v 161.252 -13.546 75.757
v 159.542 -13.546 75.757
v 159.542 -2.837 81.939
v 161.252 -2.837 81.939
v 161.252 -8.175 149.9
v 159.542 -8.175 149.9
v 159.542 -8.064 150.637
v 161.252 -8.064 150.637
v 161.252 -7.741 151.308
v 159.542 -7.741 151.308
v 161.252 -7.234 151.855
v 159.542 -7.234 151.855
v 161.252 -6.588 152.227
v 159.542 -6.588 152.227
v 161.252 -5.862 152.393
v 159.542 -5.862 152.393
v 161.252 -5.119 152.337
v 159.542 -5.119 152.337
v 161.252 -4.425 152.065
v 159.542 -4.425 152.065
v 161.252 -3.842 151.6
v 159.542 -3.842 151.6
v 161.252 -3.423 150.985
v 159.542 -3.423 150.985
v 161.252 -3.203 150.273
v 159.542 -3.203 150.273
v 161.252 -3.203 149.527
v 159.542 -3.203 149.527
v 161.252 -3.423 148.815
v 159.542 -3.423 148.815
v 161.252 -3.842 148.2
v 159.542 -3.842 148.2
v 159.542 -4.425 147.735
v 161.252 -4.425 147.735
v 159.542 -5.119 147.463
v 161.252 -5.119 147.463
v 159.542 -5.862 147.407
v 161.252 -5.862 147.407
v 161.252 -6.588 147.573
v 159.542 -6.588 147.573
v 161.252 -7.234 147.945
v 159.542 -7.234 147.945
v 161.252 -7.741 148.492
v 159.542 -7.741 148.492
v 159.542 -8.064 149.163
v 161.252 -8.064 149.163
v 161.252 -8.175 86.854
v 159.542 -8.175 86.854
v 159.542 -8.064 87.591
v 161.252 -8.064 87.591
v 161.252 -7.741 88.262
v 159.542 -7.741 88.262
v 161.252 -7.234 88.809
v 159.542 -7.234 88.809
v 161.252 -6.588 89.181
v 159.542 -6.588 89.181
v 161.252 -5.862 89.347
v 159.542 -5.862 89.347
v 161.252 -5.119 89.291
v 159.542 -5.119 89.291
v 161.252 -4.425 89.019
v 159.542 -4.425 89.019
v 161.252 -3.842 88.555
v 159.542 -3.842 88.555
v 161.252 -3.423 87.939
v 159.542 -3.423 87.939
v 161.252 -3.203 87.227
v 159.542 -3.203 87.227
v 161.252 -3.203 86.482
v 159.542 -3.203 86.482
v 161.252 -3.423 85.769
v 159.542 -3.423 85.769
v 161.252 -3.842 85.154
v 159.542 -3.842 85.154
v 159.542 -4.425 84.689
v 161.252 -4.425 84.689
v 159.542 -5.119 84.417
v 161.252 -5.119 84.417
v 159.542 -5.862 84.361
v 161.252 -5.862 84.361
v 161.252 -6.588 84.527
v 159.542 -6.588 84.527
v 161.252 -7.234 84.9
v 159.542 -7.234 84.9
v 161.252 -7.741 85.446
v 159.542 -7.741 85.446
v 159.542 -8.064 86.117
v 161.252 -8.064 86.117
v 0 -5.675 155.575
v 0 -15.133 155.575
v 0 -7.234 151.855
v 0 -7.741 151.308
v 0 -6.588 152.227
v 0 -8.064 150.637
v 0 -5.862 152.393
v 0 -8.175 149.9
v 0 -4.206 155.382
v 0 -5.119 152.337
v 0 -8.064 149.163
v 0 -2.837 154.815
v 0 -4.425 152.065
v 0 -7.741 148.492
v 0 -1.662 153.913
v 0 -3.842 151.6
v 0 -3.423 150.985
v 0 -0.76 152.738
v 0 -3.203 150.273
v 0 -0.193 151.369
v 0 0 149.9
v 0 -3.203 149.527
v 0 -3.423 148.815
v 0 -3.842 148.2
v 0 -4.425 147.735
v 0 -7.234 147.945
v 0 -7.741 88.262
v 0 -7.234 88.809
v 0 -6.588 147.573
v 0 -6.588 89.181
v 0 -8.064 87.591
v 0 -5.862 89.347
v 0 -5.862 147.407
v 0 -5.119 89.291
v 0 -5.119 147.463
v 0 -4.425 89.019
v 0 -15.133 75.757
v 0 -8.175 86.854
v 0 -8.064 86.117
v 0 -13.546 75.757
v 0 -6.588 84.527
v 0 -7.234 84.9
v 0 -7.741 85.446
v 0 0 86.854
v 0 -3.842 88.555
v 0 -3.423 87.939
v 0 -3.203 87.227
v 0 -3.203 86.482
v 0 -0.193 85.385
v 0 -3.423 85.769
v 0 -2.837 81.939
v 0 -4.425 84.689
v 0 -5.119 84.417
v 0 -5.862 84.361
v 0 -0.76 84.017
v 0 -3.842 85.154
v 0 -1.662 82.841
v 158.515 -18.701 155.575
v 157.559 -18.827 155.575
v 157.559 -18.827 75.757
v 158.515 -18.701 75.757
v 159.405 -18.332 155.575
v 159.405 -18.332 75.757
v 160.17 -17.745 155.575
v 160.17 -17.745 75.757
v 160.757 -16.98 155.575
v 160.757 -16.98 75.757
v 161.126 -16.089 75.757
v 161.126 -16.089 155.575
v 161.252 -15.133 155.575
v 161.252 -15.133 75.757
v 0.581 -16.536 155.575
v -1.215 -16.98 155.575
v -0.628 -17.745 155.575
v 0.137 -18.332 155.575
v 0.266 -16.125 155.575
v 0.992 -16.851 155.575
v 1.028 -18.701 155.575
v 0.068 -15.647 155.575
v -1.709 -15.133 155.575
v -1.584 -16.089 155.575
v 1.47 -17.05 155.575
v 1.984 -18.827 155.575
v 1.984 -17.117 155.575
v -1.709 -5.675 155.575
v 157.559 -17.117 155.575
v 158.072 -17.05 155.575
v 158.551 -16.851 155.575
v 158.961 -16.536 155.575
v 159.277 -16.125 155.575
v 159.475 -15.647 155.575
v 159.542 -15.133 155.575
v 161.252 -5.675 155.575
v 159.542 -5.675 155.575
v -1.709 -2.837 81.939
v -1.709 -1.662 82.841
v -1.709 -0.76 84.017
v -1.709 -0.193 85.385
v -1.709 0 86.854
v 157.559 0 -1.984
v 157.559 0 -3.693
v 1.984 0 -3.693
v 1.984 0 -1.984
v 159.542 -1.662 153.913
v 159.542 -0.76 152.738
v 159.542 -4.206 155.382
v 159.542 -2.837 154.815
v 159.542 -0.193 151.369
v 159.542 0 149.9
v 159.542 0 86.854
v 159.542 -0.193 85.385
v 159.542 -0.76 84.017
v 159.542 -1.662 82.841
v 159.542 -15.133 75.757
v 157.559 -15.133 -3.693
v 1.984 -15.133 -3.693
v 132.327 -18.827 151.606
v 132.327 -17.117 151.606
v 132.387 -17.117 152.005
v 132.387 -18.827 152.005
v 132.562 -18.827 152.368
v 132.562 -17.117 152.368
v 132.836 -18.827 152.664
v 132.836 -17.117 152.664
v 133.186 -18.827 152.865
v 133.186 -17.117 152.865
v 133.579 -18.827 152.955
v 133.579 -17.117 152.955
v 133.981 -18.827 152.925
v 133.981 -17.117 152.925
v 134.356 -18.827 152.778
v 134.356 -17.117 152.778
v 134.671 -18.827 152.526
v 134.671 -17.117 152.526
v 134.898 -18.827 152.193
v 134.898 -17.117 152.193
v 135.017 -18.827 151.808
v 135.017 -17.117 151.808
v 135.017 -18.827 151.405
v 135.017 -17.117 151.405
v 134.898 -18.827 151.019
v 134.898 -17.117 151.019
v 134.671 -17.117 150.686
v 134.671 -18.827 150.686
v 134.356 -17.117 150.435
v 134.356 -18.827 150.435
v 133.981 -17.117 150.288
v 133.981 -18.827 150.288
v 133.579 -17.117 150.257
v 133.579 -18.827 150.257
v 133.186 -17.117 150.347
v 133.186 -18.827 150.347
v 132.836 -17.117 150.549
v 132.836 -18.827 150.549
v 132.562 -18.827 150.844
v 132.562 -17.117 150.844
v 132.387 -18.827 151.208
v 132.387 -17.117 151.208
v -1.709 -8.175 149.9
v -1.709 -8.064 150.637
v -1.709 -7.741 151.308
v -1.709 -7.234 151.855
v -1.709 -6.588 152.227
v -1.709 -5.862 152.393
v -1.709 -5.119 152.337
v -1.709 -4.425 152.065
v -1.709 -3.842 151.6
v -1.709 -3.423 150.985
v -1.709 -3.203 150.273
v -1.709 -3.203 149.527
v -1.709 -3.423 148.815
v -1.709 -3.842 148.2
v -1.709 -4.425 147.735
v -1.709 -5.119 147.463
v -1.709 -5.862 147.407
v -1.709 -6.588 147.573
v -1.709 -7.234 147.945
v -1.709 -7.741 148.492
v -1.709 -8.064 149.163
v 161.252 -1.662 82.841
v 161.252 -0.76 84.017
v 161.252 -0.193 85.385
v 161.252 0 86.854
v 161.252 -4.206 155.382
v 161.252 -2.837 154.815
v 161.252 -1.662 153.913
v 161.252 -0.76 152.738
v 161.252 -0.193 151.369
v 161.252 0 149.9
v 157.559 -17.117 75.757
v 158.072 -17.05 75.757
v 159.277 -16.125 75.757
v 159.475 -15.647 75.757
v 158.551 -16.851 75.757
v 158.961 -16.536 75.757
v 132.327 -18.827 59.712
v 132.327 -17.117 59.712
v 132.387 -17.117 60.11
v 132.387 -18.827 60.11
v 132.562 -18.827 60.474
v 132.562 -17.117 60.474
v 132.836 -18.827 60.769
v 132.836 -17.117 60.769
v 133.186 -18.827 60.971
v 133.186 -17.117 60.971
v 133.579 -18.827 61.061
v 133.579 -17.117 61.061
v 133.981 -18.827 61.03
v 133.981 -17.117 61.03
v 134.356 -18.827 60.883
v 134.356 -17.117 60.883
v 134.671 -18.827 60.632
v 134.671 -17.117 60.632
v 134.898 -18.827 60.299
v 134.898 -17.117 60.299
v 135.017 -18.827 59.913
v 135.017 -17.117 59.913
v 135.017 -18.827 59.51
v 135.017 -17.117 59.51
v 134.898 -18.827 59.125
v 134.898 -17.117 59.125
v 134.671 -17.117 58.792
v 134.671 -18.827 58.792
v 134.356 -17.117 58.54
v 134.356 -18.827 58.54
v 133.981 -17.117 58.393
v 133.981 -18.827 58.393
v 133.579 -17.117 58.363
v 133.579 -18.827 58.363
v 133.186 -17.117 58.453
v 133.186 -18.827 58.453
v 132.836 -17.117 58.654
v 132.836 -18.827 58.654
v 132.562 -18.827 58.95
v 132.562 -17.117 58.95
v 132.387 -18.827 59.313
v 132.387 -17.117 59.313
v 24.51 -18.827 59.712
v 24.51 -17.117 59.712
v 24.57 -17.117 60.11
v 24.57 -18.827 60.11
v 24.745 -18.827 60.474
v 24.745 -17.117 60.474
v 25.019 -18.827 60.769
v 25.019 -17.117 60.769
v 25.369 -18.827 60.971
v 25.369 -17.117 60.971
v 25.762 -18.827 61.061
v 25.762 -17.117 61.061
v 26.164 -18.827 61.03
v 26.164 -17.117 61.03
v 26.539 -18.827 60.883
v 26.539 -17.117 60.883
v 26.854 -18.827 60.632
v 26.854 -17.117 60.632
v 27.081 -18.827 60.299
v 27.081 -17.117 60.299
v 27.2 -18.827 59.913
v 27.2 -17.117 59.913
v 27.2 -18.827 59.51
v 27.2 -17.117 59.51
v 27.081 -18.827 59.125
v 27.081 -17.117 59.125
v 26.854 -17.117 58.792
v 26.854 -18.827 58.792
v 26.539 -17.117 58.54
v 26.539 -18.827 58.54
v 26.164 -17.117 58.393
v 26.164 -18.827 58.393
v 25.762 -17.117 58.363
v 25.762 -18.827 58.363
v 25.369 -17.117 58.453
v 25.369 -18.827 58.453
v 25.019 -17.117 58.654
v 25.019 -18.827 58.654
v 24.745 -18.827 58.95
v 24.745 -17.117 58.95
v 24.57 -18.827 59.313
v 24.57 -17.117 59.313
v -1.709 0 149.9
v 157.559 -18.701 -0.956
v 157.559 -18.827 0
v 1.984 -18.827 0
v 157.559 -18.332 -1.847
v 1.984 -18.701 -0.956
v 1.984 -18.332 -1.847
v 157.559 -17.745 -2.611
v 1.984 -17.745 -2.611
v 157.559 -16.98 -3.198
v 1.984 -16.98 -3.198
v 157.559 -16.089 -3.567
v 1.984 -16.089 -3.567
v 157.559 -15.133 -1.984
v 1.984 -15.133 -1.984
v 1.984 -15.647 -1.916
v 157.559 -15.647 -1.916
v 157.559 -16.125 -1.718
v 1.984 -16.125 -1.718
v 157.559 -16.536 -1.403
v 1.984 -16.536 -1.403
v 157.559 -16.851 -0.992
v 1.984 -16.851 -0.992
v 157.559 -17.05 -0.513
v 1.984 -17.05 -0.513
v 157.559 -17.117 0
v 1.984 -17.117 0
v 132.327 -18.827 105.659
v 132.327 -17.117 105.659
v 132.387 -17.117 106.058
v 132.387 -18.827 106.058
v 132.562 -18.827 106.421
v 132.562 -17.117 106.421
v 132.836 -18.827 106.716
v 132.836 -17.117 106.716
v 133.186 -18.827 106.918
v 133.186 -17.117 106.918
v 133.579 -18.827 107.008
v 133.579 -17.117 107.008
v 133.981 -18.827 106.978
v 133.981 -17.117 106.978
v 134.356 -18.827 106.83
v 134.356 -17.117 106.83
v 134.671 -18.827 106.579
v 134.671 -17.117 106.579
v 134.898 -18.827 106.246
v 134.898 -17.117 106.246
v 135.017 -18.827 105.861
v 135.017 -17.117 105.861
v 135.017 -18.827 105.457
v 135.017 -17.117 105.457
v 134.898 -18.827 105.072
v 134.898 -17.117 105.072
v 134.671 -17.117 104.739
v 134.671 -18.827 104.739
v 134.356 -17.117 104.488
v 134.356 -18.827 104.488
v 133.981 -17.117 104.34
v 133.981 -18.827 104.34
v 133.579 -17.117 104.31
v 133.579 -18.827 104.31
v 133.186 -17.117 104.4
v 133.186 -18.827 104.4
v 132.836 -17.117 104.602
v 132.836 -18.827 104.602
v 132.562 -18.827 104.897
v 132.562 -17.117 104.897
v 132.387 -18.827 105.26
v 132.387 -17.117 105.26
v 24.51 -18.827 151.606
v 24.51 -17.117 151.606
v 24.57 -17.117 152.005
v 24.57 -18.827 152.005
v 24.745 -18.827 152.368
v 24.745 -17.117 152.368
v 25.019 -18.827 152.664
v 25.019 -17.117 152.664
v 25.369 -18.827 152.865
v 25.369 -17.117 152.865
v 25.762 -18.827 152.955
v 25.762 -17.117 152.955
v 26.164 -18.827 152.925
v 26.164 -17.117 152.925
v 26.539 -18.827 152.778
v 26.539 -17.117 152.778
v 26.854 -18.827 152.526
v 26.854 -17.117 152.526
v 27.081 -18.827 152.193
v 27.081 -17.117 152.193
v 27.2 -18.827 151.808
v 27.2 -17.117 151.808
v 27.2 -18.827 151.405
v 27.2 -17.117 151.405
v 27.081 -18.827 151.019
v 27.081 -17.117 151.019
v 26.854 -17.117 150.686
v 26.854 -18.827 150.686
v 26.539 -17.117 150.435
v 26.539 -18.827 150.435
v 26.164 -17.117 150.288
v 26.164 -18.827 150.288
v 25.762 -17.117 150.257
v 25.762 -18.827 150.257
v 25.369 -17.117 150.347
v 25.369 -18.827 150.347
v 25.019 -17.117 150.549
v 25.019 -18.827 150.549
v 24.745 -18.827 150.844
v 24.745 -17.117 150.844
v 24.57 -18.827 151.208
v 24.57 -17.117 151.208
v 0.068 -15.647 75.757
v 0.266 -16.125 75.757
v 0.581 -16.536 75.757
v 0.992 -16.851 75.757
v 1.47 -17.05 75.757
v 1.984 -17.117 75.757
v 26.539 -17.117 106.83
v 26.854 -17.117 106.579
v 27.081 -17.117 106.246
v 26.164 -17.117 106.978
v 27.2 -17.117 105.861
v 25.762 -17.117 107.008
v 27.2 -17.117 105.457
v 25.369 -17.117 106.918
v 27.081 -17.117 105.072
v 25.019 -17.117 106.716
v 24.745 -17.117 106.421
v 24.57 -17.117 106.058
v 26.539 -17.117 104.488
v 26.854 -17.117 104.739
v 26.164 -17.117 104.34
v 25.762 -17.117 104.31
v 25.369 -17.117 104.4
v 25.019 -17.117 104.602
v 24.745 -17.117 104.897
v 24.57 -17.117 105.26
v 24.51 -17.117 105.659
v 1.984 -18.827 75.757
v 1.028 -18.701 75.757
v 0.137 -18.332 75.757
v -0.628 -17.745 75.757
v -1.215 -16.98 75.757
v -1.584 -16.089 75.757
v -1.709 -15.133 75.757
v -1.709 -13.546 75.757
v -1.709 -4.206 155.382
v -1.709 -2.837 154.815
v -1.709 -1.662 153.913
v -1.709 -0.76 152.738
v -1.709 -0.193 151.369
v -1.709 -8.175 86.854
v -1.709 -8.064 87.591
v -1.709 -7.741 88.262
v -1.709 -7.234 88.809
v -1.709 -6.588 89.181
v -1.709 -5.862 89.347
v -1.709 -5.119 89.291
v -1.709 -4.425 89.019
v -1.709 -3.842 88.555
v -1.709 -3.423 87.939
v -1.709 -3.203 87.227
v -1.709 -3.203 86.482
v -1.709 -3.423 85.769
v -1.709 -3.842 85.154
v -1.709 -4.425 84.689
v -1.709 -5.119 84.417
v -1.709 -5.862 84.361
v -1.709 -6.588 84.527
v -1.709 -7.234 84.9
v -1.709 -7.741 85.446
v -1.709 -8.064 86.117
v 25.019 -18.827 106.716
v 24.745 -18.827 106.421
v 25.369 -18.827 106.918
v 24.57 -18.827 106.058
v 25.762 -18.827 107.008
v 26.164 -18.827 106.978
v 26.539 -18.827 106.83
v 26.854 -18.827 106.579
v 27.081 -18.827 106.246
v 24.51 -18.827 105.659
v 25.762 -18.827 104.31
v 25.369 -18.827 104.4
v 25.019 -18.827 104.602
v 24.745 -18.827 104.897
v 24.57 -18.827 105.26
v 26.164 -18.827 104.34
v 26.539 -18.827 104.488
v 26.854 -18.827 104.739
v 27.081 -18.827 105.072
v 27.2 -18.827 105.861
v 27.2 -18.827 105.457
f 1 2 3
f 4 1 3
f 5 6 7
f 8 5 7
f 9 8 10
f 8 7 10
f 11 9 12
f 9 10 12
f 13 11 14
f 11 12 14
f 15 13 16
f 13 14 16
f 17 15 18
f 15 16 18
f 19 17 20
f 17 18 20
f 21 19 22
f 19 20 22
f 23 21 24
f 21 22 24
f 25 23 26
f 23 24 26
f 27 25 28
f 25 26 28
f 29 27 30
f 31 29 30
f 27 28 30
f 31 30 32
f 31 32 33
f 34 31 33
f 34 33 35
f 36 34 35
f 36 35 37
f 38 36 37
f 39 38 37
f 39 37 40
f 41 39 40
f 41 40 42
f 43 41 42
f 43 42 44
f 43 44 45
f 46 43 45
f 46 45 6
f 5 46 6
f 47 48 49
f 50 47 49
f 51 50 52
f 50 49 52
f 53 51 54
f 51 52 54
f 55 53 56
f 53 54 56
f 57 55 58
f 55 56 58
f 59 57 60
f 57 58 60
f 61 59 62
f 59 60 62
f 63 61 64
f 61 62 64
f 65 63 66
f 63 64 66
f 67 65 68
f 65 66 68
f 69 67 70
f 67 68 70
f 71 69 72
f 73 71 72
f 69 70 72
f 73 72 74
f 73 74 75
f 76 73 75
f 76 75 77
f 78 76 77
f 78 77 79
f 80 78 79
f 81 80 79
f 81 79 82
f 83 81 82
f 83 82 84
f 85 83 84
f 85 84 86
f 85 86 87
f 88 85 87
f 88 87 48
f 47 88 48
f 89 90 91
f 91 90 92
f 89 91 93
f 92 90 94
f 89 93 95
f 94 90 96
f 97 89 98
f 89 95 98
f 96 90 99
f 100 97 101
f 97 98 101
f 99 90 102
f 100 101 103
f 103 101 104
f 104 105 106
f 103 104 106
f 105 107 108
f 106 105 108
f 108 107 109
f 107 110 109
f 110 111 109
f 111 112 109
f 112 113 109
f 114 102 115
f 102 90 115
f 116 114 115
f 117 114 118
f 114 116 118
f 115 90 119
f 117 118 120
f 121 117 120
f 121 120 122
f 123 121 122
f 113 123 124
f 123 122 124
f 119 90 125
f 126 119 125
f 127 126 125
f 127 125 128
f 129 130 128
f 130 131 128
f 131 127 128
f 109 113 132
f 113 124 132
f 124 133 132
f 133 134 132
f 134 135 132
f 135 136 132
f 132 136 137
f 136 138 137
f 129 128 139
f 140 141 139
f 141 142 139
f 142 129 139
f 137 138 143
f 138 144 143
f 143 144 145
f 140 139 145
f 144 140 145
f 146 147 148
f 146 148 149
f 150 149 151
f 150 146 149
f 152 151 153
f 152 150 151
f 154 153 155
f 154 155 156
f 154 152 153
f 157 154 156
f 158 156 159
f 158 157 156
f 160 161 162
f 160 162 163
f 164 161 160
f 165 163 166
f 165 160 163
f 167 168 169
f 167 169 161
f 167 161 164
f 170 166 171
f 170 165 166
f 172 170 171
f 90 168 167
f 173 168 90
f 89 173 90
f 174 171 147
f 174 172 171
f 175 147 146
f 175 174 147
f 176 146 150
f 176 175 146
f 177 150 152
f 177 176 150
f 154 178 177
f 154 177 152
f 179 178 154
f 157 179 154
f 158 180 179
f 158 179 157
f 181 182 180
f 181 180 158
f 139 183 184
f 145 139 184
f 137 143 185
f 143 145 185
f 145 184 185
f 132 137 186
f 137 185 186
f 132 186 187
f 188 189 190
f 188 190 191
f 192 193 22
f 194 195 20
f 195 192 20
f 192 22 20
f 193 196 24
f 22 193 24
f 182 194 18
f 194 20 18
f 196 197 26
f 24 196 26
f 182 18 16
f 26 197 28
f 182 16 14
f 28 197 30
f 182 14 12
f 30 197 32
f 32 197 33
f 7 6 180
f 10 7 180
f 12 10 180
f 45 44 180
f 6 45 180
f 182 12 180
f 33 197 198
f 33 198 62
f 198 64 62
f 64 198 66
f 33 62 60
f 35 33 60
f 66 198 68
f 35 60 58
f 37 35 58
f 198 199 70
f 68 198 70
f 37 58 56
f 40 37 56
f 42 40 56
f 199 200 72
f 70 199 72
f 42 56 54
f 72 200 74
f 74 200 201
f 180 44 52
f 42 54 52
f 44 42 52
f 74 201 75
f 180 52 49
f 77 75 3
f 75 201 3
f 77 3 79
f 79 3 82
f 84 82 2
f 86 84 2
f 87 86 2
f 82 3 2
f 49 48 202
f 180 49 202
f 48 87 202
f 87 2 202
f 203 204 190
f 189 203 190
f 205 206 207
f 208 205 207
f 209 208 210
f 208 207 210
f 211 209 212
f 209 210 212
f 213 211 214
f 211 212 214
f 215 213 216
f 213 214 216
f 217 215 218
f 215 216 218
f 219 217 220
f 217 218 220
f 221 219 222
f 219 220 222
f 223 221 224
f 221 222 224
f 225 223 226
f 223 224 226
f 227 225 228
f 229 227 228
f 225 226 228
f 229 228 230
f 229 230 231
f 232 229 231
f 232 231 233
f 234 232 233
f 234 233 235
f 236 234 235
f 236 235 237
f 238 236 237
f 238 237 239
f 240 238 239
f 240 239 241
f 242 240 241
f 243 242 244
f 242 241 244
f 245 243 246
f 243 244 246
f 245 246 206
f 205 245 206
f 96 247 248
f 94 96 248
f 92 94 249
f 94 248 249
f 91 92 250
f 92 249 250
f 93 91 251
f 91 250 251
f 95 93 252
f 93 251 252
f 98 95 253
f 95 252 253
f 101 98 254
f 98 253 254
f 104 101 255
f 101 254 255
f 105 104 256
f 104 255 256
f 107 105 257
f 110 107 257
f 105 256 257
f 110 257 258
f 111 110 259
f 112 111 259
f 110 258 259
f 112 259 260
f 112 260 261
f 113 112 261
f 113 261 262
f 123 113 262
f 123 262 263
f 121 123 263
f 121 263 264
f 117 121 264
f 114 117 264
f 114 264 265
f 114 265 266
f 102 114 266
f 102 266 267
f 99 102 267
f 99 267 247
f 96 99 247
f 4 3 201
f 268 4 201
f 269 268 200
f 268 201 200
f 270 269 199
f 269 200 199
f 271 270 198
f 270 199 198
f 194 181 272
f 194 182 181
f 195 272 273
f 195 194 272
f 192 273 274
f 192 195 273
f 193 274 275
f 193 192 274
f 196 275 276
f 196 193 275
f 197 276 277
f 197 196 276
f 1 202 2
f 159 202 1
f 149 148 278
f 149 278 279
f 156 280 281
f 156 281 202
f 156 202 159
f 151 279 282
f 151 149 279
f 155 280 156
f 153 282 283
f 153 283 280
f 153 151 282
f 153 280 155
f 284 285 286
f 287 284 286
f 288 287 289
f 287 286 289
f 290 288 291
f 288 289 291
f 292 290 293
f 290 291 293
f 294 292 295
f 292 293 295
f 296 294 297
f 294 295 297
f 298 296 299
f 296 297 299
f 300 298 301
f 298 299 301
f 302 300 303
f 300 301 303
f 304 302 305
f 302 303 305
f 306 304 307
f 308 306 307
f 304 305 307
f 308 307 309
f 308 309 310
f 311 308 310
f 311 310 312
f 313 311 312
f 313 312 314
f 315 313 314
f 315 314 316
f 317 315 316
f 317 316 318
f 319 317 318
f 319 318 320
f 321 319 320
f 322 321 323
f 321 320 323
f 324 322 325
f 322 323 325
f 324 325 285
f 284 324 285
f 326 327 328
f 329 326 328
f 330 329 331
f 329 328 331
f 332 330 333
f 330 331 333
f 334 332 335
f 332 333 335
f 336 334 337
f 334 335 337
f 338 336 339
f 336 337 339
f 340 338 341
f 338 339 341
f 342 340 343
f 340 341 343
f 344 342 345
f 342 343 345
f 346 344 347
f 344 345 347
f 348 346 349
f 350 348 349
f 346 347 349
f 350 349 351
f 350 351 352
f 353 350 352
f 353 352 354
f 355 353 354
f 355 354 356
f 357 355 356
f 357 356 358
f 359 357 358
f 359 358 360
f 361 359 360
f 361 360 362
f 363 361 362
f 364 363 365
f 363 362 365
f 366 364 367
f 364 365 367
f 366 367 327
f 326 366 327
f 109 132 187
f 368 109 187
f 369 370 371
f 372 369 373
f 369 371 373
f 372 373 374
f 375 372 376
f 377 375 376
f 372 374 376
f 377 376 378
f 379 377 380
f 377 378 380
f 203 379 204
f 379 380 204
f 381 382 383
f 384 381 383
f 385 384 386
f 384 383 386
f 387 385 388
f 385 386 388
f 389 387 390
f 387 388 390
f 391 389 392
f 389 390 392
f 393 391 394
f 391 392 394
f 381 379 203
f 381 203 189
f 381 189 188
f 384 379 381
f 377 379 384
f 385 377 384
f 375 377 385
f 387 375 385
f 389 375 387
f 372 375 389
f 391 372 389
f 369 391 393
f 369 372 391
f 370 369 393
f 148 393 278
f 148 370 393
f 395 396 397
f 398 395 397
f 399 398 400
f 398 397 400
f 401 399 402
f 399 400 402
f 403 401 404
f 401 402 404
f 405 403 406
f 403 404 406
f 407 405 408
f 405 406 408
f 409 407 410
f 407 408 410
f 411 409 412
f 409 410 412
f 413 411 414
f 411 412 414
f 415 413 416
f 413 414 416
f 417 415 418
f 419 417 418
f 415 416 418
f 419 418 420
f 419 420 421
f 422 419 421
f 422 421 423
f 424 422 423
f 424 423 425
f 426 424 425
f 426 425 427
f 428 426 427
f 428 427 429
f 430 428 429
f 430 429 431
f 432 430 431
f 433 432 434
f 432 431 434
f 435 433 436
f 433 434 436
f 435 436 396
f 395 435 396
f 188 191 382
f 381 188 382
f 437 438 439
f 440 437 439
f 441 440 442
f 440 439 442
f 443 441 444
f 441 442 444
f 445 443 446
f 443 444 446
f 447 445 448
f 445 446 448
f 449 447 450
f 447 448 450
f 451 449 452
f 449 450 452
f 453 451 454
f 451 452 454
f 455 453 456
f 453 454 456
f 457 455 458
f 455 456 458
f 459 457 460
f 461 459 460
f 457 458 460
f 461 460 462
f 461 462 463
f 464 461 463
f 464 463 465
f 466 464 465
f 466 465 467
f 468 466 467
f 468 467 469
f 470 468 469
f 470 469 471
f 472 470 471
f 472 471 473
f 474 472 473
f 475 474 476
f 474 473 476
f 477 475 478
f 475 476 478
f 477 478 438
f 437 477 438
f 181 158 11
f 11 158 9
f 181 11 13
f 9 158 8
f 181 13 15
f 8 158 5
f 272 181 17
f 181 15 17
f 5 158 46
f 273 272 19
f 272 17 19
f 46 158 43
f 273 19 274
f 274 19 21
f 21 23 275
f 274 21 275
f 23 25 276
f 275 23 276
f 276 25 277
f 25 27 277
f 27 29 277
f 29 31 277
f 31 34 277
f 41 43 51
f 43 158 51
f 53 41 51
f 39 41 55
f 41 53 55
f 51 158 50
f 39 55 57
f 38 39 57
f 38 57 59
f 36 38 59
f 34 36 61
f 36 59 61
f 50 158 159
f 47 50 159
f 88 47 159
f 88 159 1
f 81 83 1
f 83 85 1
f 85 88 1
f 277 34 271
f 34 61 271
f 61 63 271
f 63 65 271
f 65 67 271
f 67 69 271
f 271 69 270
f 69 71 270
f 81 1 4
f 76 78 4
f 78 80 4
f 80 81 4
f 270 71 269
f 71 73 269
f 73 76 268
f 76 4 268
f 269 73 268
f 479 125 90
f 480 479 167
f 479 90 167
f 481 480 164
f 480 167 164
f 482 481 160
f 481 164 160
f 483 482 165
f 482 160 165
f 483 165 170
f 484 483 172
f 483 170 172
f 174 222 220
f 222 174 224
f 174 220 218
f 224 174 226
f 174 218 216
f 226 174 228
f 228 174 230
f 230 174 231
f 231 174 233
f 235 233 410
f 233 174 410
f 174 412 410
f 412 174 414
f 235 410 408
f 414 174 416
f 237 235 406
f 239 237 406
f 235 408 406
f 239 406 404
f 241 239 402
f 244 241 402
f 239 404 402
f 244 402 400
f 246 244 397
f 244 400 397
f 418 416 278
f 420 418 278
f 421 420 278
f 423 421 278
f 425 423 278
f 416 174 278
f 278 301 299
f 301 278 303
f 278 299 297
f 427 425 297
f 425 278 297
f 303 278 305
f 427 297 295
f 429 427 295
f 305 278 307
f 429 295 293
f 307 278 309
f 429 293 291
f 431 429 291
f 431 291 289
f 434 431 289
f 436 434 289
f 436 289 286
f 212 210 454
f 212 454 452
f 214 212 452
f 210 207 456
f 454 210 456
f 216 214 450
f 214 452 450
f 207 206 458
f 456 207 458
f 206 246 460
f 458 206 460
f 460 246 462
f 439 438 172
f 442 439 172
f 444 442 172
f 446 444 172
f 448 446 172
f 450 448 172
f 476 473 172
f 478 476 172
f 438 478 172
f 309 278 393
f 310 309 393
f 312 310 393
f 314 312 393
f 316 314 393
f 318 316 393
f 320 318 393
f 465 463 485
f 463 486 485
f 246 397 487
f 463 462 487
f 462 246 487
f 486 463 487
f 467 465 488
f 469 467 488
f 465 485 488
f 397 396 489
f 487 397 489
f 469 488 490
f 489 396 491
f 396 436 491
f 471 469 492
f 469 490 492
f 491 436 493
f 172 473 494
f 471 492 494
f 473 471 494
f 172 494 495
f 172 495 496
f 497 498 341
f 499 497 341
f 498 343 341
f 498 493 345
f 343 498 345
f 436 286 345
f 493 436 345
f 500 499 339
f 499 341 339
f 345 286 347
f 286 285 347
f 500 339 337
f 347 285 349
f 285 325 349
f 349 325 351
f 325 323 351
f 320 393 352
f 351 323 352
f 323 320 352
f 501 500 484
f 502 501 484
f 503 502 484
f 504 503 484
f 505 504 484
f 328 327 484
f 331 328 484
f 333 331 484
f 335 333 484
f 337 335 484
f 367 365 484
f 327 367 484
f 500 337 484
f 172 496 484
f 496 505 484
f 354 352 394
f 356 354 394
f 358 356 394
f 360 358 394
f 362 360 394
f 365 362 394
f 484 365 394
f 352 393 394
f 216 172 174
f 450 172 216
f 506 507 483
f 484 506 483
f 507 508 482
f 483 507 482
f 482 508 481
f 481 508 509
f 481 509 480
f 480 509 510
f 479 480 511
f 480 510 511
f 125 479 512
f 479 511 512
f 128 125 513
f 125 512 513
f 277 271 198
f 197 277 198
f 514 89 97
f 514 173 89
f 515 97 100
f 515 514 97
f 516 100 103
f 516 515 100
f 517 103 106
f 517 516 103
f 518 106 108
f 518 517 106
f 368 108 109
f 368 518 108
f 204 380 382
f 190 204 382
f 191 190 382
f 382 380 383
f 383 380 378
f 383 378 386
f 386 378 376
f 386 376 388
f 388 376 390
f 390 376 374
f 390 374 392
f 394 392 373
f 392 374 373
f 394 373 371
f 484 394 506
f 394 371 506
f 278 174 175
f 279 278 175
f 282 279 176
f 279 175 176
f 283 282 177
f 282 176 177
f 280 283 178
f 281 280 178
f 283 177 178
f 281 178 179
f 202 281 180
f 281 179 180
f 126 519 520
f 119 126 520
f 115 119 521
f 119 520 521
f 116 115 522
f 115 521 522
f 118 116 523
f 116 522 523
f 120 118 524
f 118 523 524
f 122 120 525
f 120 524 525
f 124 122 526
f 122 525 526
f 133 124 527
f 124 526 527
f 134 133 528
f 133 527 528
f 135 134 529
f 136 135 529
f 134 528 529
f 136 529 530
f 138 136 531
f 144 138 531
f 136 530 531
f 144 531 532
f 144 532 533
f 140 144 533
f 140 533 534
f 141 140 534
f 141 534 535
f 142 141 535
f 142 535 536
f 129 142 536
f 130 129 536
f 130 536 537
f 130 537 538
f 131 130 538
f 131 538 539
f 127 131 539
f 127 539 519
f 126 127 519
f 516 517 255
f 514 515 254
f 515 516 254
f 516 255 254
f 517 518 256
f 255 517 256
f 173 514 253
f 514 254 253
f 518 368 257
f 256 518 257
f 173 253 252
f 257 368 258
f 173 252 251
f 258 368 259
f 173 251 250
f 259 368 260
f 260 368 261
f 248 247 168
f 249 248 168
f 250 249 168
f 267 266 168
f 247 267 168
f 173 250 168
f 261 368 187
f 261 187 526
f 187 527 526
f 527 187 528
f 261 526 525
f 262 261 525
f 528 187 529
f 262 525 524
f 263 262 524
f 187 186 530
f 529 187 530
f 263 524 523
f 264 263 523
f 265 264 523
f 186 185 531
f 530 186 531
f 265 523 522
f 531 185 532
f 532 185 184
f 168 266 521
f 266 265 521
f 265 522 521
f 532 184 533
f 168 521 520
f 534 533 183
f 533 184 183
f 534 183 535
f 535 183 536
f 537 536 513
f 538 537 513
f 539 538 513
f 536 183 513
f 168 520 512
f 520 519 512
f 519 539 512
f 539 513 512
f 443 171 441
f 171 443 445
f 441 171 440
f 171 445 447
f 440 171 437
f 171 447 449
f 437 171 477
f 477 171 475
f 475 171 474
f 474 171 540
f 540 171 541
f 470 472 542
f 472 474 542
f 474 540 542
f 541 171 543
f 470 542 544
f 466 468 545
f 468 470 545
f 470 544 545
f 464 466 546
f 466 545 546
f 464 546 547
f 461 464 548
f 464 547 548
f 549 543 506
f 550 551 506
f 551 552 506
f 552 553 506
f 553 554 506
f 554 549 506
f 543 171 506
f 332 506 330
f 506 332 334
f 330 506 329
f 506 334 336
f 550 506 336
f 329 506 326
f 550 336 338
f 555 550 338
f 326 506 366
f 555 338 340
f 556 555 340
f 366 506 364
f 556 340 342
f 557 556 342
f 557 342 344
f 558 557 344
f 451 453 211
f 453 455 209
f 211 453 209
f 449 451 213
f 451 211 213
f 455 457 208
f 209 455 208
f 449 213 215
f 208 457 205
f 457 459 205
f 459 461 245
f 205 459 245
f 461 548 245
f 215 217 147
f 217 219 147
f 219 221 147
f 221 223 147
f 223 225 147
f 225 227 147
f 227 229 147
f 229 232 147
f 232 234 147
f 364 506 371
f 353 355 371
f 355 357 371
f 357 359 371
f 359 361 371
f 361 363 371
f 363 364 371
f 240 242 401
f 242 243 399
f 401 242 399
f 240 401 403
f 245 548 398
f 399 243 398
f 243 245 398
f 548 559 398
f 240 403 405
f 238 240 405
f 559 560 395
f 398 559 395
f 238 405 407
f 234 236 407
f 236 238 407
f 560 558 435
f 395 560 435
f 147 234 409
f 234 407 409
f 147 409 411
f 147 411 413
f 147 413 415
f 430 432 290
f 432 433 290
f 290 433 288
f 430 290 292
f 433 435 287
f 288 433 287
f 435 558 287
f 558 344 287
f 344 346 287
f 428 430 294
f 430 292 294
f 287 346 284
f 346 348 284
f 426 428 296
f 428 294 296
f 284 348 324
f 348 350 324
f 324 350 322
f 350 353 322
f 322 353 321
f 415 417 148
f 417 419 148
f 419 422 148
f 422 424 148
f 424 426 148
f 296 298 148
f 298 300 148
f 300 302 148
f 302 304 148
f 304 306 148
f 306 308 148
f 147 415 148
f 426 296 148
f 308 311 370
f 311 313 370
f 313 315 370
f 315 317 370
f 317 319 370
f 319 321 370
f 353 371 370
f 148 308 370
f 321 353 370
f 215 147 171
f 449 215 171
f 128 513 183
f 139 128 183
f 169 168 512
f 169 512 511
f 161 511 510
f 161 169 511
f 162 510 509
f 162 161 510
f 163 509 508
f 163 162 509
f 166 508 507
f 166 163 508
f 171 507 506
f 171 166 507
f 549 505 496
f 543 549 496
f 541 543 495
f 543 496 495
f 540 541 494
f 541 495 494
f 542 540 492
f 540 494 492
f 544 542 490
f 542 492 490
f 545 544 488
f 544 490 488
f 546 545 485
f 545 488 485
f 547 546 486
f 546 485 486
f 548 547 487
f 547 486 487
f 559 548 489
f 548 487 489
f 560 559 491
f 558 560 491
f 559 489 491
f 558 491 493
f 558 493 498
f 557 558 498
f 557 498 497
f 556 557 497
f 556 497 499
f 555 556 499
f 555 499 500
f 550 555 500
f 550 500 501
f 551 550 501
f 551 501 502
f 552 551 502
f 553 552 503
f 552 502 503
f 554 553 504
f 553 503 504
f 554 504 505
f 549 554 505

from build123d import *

# Parameters (mm, degrees)
F1_DEPTH  = 155.575
F2_R      = 3.69316
F3_R      = 1.98374
F7_DEPTH  = 155.575
F8_R      = 2.5
F9_DEPTH  = 162.96132
F10_R     = 5.674995
F11_R     = 1.35255
F12_DEPTH = 1.70942
F13_W     = 3.69316
F13_H     = 75.7569519651
F14_DEPTH = 3.69316


with BuildPart() as f1:
    # F0 (on Top) → F1 (new body)
    with BuildSketch(Plane.XY):
        Polygon((0, 0), (-1.70942, 0), (-1.70942, -18.8265943), (161.2519, -18.8265943), (161.2519, 0), (159.54248, 0), (159.54248, -17.1171743), (0, -17.1171743), align=None)
    extrude(amount=F1_DEPTH)

    # F2
    f2_edges = [f1.edges().sort_by_distance(p)[0] for p in [
        (161.2519, -18.826594, 77.7875),
        (-1.70942, -18.826594, 77.7875),
    ]]
    fillet(f2_edges, radius=F2_R)

    # F3
    f3_edges = [f1.edges().sort_by_distance(p)[0] for p in [
        (159.54248, -17.117174, 77.7875),
        (0, -17.117174, 77.7875),
    ]]
    fillet(f3_edges, radius=F3_R)

    # F5 (on offset) → F7 (join, through all)
    with BuildSketch(Plane.YZ.offset(1.98374)):
        with BuildLine():
            Line((-17.1171743, 0), (-18.8265943, 0))
            ThreePointArc((-18.8265943, 0), (-17.74489278, -2.61145848), (-15.1334343, -3.69316))
            Line((-15.1334343, -3.69316), (0, -3.69316))
            Line((0, -3.69316), (0, -1.98374))
            Line((0, -1.98374), (-15.1334343, -1.98374))
            ThreePointArc((-15.1334343, -1.98374), (-16.5361503061, -1.4027160061), (-17.1171743, 0))
        make_face()
    extrude(amount=F7_DEPTH)

    # F8 (on face) → F9 (cut, through all)
    with BuildSketch(Plane(origin=(-1.70942, 0, 0), x_dir=(0, -1, 0), z_dir=(-1, 0, 0))):
        with Locations((5.675, 149.9)):
            Circle(F8_R)
        with Locations((5.675, 86.8541635573)):
            Circle(F8_R)
        with BuildLine():
            ThreePointArc((2.8375, 81.9394693908), (0.7603058335, 84.0166635573), (0, 86.8541635573))
            Line((0, 86.8541635573), (0, 0))
            Line((0, 0), (15.1334343, 0))
            Line((15.1334343, 0), (15.1334343, 75.7569519651))
            Line((15.1334343, 75.7569519651), (13.5459343, 75.7569519651))
            Line((13.5459343, 75.7569519651), (2.8375, 81.9394693908))
        make_face()
    extrude(amount=-F9_DEPTH, mode=Mode.SUBTRACT)

    # F10
    f10_edges = [f1.edges().sort_by_distance(p)[0] for p in [
        (-0.85471, 0, 155.575),
        (160.39719, 0, 155.575),
    ]]
    fillet(f10_edges, radius=F10_R)

    # F11 (on face) → F12 (cut, through all)
    with BuildSketch(Plane(origin=(0, -17.1171743, 0), x_dir=(-1, 0, 0), z_dir=(0, 1, 0))):
        with Locations((-25.8627459407, 59.7118170977)):
            Circle(F11_R)
        with Locations((-25.8627459407, 105.6590335488)):
            Circle(F11_R)
        with Locations((-25.8627459407, 151.60625)):
            Circle(F11_R)
        with Locations((-133.6797340593, 151.60625)):
            Circle(F11_R)
        with Locations((-133.6797340593, 105.6590335488)):
            Circle(F11_R)
        with Locations((-133.6797340593, 59.7118170977)):
            Circle(F11_R)
    extrude(amount=-F12_DEPTH, mode=Mode.SUBTRACT)

    # F13 (on face) → F14 (cut, through all)
    with BuildSketch(Plane.XZ.offset(18.8265943)):
        with Locations((0.13716, 37.8784759826)):
            Rectangle(F13_W, F13_H)
        with Locations((159.40532, 37.8784759826)):
            Rectangle(F13_W, F13_H)
    extrude(amount=-F14_DEPTH, mode=Mode.SUBTRACT)


solid = f1.part
